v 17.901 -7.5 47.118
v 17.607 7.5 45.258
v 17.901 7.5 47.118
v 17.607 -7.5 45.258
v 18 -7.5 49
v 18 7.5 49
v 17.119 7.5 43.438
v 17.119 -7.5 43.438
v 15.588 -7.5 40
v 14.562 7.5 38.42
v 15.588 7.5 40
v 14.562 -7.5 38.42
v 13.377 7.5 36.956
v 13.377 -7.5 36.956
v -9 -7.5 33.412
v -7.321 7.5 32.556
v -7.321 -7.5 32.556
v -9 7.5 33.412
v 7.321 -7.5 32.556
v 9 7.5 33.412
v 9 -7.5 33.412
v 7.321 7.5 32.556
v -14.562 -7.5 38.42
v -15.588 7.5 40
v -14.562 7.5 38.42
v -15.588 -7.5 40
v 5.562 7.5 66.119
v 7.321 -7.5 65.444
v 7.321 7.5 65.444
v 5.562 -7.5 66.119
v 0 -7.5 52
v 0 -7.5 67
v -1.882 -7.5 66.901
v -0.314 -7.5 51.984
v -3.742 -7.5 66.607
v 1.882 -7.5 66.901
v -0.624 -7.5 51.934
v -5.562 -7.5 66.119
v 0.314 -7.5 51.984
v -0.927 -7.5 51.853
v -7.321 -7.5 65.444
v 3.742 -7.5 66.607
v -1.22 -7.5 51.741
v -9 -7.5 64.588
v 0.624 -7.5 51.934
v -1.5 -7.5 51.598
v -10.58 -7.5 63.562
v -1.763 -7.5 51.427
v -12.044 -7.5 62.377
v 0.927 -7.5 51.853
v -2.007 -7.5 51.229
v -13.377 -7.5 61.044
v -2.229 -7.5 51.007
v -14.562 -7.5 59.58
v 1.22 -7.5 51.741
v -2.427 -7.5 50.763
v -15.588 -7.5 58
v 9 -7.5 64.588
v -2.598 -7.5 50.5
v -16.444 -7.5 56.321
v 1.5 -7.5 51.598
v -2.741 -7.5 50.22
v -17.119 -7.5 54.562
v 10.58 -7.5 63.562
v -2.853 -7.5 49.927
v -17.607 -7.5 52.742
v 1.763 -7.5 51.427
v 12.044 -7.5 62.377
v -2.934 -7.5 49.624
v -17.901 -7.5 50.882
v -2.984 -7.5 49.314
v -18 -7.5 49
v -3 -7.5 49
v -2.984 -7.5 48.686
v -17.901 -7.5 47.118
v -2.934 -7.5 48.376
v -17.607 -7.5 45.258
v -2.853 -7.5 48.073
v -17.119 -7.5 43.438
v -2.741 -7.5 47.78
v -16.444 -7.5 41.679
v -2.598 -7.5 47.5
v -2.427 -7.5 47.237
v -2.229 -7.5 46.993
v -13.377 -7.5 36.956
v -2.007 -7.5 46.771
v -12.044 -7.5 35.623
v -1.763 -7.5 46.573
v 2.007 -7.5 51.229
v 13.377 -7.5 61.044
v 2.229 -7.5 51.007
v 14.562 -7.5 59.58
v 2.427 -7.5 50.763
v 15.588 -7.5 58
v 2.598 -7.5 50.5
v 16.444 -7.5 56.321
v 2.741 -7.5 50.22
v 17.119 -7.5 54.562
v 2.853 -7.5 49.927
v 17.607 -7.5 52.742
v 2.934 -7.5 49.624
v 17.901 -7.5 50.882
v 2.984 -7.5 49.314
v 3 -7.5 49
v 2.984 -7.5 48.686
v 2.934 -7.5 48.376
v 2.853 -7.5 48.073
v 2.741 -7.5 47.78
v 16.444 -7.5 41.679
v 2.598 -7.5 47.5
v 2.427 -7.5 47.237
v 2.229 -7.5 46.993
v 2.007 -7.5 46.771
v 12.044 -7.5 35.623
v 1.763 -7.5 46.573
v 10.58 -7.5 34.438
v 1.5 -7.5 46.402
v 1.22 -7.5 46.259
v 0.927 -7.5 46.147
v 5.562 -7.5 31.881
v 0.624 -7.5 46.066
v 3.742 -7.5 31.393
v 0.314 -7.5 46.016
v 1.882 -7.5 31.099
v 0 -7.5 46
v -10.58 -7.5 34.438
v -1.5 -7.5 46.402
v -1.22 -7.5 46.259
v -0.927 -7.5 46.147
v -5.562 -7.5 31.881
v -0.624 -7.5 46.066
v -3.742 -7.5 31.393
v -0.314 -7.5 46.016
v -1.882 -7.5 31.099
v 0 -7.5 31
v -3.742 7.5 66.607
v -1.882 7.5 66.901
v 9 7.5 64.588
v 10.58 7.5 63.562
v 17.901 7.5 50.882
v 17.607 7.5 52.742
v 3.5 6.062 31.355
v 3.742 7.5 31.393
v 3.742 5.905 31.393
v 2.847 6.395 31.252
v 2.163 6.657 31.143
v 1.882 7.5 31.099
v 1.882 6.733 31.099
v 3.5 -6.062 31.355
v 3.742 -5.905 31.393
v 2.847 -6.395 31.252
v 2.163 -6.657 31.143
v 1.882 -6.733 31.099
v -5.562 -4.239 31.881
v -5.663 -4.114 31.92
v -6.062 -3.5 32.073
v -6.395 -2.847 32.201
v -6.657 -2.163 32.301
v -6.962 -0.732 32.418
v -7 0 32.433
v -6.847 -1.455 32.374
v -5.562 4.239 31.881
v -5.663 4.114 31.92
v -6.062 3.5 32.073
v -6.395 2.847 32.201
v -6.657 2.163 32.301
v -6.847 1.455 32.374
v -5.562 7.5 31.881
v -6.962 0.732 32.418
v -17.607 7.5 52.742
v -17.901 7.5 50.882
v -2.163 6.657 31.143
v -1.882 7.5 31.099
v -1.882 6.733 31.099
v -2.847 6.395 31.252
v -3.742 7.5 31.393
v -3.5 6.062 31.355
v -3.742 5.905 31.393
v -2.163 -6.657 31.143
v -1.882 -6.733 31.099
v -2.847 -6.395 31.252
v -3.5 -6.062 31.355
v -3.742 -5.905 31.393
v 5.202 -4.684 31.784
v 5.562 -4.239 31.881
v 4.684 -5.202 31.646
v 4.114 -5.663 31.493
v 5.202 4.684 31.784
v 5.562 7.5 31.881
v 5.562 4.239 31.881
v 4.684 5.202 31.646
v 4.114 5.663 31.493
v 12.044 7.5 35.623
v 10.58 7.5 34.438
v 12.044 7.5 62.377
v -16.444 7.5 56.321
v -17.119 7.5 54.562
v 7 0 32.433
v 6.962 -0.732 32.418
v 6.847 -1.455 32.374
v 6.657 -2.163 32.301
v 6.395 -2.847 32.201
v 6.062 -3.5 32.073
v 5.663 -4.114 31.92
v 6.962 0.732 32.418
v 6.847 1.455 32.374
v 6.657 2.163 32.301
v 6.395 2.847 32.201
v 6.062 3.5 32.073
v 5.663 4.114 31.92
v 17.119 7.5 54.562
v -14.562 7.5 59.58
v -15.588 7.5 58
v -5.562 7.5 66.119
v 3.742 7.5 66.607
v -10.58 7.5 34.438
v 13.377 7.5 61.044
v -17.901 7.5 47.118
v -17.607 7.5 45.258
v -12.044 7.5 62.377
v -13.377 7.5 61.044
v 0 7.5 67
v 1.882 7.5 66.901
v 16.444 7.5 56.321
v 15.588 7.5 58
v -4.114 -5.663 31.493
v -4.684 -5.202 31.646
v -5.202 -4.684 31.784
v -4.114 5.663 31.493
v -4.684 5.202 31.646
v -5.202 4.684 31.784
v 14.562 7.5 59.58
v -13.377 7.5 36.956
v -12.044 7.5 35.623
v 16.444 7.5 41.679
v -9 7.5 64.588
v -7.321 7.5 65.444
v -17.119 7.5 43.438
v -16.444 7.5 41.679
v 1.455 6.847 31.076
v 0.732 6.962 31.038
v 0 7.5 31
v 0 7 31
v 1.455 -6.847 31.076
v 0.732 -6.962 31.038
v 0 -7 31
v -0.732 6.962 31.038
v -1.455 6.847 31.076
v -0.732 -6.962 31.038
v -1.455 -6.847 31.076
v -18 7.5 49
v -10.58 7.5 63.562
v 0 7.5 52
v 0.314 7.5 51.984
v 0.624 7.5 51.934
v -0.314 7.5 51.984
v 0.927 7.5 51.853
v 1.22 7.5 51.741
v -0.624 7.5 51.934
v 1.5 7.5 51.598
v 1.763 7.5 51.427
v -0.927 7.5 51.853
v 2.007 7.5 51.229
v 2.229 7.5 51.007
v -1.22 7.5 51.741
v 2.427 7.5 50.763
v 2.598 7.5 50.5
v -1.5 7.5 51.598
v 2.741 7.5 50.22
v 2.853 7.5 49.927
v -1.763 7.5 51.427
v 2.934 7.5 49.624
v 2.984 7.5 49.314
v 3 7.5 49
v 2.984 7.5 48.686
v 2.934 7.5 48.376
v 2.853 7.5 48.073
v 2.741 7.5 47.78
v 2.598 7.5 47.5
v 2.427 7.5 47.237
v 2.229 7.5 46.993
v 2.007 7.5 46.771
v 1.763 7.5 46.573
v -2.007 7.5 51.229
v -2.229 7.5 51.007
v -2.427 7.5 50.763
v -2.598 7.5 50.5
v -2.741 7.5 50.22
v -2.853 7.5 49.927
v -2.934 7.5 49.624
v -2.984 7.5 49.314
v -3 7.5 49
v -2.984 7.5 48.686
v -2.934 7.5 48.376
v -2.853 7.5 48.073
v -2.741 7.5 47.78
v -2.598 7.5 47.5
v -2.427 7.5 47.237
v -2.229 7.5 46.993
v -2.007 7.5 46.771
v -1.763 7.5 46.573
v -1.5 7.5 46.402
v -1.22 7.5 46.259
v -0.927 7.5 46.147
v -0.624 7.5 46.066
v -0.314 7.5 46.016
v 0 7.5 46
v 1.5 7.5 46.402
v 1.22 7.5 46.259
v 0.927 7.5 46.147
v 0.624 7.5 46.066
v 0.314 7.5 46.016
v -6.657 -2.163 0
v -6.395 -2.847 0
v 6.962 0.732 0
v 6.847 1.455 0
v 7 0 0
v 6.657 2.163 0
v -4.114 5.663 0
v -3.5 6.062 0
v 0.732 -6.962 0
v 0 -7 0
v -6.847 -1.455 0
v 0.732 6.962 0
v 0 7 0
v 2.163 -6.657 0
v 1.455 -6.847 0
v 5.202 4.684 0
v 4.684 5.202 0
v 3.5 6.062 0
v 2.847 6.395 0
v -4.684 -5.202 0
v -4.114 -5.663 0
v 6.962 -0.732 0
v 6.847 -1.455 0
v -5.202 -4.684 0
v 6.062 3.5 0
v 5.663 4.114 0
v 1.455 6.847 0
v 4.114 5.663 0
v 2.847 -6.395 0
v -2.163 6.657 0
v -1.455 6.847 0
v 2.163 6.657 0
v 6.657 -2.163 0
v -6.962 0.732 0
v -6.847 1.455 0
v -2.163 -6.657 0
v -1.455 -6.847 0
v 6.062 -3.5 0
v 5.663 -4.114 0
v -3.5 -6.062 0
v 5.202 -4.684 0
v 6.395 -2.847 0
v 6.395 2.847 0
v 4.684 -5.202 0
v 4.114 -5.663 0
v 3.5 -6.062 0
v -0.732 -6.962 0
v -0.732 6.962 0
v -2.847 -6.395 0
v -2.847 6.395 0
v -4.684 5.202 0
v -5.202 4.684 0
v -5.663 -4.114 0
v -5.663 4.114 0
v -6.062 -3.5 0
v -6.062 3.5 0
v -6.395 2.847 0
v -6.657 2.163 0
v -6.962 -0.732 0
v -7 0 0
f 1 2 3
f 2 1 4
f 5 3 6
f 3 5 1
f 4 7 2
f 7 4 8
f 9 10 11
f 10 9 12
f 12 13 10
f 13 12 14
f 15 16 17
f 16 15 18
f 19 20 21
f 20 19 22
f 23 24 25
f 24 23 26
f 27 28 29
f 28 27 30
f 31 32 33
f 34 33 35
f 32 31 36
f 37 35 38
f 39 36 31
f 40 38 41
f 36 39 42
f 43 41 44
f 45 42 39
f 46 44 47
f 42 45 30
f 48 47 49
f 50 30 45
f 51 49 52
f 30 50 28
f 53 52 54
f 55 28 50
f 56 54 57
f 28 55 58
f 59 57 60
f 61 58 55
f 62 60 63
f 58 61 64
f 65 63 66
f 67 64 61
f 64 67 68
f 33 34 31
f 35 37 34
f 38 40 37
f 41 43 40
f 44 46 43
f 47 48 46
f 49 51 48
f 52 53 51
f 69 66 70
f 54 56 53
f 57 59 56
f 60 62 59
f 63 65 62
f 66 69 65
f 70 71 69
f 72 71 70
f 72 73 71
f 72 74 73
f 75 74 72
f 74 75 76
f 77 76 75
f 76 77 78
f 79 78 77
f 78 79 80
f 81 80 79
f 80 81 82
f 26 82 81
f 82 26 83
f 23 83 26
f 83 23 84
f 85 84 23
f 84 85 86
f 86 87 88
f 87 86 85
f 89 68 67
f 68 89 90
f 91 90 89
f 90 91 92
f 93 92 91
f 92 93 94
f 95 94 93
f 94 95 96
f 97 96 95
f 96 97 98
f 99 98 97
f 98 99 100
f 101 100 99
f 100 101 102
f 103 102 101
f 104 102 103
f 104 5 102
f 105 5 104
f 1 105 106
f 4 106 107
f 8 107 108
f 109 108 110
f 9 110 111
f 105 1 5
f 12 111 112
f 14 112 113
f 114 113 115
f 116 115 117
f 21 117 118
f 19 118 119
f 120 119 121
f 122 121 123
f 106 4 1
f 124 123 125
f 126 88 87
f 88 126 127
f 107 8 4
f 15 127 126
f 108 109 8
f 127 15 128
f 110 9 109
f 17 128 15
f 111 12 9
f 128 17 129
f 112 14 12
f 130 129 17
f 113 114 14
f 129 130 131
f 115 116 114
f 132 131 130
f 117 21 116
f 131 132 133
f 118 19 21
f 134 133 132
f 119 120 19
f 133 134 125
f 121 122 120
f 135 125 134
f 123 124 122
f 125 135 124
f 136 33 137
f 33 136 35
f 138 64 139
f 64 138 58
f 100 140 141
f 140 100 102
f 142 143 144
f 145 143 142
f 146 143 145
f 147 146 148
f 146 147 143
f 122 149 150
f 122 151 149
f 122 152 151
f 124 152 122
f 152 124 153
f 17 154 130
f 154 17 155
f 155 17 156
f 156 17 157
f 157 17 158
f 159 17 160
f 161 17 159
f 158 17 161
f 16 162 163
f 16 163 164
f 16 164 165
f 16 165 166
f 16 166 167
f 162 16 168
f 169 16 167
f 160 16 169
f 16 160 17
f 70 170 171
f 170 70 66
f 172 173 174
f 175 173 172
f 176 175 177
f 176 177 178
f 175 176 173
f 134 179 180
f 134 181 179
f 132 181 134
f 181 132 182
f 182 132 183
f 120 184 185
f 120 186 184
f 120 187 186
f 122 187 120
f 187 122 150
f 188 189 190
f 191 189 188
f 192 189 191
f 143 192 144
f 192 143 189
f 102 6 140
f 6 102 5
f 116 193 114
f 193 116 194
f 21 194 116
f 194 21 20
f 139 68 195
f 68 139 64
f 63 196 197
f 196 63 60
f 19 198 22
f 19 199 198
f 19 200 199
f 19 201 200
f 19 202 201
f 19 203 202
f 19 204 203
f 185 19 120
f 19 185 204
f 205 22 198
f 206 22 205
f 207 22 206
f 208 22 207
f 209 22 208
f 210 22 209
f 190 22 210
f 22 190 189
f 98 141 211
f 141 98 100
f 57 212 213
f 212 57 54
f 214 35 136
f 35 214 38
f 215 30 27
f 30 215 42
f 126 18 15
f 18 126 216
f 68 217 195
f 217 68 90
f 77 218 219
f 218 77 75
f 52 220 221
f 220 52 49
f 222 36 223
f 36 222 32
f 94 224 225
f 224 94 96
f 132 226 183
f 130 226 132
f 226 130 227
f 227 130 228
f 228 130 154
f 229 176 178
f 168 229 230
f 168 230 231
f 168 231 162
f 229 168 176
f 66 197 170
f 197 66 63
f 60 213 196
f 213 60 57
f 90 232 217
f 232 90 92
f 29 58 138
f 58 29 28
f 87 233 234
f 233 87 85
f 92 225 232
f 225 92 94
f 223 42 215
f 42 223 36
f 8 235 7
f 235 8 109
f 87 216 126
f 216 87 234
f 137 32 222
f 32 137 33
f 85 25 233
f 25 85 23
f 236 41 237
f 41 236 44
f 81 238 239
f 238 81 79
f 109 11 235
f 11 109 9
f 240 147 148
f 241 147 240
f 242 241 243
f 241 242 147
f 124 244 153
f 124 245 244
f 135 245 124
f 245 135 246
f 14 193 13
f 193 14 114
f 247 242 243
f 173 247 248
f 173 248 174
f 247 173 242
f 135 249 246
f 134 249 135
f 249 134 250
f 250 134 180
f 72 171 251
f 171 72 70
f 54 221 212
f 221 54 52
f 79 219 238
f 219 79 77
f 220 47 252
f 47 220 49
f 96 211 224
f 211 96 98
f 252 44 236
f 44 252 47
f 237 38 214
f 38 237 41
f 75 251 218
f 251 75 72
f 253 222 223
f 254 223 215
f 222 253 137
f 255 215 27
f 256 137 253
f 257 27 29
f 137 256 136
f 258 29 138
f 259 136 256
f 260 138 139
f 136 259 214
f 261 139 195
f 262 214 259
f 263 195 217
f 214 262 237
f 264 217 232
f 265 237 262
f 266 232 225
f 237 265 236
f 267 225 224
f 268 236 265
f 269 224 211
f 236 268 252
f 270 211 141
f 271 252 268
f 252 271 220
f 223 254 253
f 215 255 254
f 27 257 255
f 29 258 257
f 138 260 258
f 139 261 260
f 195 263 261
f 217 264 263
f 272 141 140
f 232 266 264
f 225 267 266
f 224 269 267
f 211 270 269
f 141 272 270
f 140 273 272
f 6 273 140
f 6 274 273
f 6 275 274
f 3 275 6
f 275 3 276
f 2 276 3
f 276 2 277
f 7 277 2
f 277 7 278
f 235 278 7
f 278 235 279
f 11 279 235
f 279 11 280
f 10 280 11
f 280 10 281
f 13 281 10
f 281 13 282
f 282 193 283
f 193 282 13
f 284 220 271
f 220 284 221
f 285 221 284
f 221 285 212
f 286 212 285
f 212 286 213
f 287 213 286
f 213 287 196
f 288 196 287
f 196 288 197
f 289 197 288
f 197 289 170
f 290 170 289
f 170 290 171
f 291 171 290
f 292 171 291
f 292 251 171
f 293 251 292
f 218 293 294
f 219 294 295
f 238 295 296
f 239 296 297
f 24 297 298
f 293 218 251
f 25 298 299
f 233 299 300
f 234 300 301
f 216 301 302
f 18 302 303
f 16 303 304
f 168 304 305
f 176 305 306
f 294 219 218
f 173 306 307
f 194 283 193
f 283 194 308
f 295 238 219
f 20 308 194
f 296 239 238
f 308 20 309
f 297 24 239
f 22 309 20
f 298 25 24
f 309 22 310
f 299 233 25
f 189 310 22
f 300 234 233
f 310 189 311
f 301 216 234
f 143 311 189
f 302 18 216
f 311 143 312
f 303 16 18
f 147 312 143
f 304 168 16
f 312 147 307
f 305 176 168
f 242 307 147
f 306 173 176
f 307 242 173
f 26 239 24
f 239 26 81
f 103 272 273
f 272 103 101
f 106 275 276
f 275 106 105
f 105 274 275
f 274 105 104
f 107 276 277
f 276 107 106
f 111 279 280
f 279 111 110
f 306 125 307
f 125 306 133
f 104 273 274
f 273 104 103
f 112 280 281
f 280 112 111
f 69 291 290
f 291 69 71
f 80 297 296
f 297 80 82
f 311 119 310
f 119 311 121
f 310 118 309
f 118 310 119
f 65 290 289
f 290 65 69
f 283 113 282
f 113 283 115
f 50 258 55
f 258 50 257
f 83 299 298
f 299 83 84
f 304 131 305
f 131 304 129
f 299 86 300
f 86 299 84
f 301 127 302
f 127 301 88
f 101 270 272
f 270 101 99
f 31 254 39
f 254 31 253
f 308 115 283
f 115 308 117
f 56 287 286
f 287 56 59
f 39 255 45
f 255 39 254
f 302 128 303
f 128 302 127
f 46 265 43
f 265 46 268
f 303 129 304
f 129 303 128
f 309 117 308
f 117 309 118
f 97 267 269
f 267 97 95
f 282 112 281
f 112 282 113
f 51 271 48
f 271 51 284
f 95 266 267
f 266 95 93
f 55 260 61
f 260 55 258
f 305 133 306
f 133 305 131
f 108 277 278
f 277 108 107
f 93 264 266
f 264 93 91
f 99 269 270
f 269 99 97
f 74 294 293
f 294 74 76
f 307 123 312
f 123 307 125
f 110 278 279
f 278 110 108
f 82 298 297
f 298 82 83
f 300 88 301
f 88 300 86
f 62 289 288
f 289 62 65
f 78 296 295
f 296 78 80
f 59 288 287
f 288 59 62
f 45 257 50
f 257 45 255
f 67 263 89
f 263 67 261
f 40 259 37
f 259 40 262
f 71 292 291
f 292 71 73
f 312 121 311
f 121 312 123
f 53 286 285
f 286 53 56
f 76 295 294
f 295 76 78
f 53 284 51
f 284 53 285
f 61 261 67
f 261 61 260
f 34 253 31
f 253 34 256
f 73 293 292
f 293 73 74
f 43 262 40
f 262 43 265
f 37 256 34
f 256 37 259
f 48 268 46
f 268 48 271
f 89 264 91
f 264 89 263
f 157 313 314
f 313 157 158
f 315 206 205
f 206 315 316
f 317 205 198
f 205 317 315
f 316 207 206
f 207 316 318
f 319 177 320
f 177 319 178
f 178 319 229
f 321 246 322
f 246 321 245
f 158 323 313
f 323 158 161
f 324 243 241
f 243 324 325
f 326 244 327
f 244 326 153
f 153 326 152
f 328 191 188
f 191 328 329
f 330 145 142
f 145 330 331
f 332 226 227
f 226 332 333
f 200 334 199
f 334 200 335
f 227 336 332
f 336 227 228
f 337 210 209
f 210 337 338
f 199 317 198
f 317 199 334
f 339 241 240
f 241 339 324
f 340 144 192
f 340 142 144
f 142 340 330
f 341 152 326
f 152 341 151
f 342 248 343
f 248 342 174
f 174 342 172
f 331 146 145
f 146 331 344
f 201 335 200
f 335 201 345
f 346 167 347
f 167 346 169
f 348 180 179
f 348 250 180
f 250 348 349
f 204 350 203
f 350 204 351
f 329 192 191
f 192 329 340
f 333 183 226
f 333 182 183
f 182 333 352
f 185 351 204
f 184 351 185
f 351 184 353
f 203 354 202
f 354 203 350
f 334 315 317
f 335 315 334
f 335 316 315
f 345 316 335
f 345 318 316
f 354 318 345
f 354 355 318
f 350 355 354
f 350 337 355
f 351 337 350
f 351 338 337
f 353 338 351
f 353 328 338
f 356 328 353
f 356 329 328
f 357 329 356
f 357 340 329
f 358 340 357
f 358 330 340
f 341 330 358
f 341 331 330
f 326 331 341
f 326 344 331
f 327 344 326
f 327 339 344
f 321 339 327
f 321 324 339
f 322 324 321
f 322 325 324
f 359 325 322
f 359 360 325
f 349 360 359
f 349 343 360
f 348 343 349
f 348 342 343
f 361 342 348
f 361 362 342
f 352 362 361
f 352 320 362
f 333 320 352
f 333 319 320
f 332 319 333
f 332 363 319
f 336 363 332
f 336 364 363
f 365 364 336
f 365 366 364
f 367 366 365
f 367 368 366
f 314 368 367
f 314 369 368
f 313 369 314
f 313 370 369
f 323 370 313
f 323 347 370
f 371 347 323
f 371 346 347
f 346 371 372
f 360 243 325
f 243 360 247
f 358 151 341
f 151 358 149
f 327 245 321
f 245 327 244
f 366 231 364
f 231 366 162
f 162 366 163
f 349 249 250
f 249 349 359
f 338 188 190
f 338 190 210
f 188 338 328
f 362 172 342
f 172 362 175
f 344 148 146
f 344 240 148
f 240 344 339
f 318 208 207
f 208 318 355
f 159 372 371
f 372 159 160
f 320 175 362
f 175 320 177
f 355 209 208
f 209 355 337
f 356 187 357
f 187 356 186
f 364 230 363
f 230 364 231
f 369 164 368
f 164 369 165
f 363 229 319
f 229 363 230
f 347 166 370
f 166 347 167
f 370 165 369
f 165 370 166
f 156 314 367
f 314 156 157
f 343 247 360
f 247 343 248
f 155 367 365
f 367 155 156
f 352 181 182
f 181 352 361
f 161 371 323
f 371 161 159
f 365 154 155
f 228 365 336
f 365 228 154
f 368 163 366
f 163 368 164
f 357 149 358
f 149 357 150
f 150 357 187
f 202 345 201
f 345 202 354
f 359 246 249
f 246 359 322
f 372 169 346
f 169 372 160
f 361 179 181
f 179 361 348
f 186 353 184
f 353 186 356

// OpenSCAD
// Flat-eye bolt with a smooth shaft.
$fn = 60;
eps = 0.02;
shaft_d = 14;
shaft_l = 32;
eye_outer_d = 36;
eye_inner_d = eye_outer_d - 2 * 15;
eye_t = 15;
module eye() {
    translate([0, -eye_t / 2, shaft_l + eye_outer_d / 2 - 1]) rotate([-90, 0, 0])
        difference() { cylinder(d = eye_outer_d, h = eye_t); translate([0, 0, -eps]) cylinder(d = eye_inner_d, h = eye_t + 2 * eps); }
}
union() { cylinder(d = shaft_d, h = shaft_l + 2); eye(); }
